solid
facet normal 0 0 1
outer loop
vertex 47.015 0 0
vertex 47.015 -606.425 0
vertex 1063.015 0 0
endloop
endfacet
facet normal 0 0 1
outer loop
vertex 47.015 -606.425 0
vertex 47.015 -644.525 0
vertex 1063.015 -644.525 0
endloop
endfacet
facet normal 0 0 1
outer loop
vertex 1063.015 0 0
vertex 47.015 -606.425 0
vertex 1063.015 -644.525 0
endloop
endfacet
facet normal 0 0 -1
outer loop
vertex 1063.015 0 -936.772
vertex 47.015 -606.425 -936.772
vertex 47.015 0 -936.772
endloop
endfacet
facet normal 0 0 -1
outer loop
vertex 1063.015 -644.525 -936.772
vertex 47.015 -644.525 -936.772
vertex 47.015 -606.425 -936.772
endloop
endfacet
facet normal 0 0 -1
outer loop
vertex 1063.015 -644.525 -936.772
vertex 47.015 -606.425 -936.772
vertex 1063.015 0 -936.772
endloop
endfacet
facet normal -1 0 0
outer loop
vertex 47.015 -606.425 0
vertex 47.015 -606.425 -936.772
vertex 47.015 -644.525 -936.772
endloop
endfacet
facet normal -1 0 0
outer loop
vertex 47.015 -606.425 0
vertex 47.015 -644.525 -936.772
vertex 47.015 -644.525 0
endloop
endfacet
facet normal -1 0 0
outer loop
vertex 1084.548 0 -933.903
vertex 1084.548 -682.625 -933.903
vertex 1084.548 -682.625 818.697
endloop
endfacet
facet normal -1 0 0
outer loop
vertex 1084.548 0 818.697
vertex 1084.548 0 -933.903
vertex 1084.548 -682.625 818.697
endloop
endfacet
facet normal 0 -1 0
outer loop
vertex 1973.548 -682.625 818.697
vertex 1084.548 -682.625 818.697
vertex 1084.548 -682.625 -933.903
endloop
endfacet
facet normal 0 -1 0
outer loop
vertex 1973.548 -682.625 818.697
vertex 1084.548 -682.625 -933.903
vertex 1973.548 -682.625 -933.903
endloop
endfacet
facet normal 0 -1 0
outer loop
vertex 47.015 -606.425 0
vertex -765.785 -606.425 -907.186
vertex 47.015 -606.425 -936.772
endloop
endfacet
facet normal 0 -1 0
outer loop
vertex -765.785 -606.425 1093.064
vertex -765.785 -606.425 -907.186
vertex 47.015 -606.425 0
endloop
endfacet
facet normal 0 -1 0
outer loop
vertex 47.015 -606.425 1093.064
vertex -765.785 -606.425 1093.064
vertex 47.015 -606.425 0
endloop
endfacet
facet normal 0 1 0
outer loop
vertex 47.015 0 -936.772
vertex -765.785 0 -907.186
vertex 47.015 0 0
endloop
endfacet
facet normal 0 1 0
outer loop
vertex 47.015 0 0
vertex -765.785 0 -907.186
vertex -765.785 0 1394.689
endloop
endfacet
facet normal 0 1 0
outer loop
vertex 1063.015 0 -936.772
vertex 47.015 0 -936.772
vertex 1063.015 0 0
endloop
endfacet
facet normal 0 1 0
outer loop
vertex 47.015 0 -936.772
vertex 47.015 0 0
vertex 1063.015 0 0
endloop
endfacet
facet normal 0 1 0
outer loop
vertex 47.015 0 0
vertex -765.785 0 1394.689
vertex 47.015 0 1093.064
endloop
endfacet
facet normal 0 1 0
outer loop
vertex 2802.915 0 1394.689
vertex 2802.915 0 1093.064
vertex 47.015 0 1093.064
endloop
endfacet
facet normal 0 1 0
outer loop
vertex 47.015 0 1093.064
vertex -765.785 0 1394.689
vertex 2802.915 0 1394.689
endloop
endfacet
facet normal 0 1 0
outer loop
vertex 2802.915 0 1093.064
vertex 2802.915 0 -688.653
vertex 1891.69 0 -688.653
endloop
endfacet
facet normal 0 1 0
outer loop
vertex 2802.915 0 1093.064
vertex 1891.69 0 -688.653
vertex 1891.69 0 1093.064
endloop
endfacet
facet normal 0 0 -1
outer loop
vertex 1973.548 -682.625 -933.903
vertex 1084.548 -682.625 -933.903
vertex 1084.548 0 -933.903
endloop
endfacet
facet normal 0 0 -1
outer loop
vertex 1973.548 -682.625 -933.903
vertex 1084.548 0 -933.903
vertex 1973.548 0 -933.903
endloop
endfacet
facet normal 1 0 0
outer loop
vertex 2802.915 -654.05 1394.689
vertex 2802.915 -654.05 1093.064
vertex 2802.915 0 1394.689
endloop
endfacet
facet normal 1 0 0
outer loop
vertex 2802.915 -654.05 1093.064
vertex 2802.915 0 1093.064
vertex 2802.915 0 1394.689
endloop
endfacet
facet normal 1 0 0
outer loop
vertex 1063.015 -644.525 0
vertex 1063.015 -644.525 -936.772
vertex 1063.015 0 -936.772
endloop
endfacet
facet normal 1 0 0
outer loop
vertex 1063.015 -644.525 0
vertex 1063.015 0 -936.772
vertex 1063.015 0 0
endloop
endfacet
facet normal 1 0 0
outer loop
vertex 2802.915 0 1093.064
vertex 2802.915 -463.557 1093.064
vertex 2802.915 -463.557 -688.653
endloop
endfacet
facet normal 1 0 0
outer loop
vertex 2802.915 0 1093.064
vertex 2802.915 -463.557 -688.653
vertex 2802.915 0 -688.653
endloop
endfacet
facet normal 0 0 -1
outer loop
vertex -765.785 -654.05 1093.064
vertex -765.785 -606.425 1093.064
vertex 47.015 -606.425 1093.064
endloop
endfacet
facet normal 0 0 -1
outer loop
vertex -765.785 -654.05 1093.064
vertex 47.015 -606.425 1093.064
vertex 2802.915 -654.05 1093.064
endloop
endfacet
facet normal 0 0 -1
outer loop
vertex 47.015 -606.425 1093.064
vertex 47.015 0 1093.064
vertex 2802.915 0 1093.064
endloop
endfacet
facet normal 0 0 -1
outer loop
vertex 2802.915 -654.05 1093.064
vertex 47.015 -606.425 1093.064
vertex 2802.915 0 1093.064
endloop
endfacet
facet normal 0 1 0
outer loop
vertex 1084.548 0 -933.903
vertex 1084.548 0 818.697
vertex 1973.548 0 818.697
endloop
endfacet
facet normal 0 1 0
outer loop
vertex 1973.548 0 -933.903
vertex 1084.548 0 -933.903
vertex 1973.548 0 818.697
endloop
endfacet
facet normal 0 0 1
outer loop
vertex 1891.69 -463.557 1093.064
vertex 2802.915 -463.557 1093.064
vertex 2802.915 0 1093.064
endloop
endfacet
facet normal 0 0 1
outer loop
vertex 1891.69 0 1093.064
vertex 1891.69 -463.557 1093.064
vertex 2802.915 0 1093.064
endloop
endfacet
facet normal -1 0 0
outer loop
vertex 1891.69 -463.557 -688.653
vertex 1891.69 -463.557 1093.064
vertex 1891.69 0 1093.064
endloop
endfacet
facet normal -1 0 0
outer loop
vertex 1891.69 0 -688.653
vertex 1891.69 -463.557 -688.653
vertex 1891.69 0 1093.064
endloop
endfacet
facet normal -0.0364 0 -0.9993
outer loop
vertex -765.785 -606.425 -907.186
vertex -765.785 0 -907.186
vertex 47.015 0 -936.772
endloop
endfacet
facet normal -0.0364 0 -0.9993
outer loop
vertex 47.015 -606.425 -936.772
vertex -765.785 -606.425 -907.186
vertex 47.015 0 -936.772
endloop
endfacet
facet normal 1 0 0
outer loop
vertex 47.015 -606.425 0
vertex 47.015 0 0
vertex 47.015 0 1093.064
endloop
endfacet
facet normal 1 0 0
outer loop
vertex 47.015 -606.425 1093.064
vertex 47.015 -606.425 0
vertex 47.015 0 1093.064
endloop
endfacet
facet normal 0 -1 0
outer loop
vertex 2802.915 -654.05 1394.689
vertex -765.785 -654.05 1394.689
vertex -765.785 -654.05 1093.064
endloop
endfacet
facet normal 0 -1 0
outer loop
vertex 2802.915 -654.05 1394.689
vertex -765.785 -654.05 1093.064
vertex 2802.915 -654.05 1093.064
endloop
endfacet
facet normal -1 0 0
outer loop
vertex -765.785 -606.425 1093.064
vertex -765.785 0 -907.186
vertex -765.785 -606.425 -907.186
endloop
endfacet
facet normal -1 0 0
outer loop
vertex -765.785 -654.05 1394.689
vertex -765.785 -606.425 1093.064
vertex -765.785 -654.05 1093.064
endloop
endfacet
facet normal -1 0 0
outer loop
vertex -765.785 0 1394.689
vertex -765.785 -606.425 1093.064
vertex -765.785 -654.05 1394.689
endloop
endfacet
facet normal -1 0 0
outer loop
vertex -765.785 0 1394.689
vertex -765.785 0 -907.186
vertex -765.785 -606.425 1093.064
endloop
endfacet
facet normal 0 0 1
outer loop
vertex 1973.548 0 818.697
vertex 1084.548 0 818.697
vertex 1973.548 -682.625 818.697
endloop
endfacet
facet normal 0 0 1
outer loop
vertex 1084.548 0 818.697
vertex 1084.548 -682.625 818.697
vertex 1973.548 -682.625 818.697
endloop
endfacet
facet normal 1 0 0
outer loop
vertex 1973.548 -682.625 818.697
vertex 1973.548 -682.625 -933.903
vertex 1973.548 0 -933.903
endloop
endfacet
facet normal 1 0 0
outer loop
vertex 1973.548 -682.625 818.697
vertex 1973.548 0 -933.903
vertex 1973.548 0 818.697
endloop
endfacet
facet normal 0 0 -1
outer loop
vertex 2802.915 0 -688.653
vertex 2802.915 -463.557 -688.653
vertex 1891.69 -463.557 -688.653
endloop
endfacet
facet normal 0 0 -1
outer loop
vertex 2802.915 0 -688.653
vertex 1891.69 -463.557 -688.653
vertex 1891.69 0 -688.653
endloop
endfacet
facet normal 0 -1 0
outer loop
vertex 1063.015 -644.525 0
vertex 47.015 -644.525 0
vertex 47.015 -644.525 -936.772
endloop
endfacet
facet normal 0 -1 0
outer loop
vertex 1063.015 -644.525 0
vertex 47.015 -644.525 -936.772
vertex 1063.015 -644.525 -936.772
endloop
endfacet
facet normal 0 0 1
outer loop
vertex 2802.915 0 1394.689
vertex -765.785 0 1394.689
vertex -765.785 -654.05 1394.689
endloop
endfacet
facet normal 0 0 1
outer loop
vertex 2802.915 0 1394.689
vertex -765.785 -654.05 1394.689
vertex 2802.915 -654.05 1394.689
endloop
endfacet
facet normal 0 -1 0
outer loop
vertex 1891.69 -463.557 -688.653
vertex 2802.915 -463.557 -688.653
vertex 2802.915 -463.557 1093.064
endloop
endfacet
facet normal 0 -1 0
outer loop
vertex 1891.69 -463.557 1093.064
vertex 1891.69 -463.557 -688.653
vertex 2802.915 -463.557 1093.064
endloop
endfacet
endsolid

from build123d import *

# Parameters (mm, degrees)
F1_DEPTH      = 606.425
F2_W          = 1016
F2_H          = 936.7715999644
F3_DEPTH      = 38.1
F3_DEPTH_BACK = 606.425
F4_W          = 3568.7
F4_H          = 301.625
F5_DEPTH      = 606.425
F5_DEPTH_BACK = 47.625
F6_W          = 889
F6_H          = 1752.6
F7_DEPTH      = 76.2
F7_DEPTH_BACK = 606.425
F8_W          = 463.5573923588
F8_H          = 1781.7167063635
F9_DEPTH      = 911.225


with BuildPart() as f1:
    # F0 (on Front) → F1 (new body)
    with BuildSketch(Plane.XZ):
        Polygon((-765.7850623447, 1093.0638333242), (-765.7850623447, -907.1861666758), (47.0149376553, -936.7715999644), (47.0149376553, 1093.0638333242), align=None)
    extrude(amount=F1_DEPTH)

    # F2 (on face) → F3 (join, two sides)
    with BuildSketch(Plane.XZ.offset(606.425)) as f3_sk:
        with Locations((555.0149376553, -468.3857999822)):
            Rectangle(F2_W, F2_H)
    extrude(amount=F3_DEPTH)
    extrude(f3_sk.sketch, amount=-F3_DEPTH_BACK)

    # F4 (on face) → F5 (join, two sides)
    with BuildSketch(Plane.XZ.offset(606.425)) as f5_sk:
        with Locations((1018.5649376553, 1243.8763333242)):
            Rectangle(F4_W, F4_H)
    extrude(amount=-F5_DEPTH)
    extrude(f5_sk.sketch, amount=F5_DEPTH_BACK)


with BuildPart() as f7:
    # F6 (on face) → F7 (new body, two sides)
    with BuildSketch(Plane.XZ.offset(606.425)) as f7_sk:
        with Locations((1529.0475479126, -57.6029500447)):
            Rectangle(F6_W, F6_H)
    extrude(amount=F7_DEPTH)
    extrude(f7_sk.sketch, amount=-F7_DEPTH_BACK)


with BuildPart() as f9:
    # F8 (on face) → F9 (new body)
    with BuildSketch(Plane.YZ.offset(2802.9149376553)):
        with Locations((-231.7786961794, 202.2054801425)):
            Rectangle(F8_W, F8_H)
    extrude(amount=-F9_DEPTH)


solid = Compound([f1.part, f7.part, f9.part])
